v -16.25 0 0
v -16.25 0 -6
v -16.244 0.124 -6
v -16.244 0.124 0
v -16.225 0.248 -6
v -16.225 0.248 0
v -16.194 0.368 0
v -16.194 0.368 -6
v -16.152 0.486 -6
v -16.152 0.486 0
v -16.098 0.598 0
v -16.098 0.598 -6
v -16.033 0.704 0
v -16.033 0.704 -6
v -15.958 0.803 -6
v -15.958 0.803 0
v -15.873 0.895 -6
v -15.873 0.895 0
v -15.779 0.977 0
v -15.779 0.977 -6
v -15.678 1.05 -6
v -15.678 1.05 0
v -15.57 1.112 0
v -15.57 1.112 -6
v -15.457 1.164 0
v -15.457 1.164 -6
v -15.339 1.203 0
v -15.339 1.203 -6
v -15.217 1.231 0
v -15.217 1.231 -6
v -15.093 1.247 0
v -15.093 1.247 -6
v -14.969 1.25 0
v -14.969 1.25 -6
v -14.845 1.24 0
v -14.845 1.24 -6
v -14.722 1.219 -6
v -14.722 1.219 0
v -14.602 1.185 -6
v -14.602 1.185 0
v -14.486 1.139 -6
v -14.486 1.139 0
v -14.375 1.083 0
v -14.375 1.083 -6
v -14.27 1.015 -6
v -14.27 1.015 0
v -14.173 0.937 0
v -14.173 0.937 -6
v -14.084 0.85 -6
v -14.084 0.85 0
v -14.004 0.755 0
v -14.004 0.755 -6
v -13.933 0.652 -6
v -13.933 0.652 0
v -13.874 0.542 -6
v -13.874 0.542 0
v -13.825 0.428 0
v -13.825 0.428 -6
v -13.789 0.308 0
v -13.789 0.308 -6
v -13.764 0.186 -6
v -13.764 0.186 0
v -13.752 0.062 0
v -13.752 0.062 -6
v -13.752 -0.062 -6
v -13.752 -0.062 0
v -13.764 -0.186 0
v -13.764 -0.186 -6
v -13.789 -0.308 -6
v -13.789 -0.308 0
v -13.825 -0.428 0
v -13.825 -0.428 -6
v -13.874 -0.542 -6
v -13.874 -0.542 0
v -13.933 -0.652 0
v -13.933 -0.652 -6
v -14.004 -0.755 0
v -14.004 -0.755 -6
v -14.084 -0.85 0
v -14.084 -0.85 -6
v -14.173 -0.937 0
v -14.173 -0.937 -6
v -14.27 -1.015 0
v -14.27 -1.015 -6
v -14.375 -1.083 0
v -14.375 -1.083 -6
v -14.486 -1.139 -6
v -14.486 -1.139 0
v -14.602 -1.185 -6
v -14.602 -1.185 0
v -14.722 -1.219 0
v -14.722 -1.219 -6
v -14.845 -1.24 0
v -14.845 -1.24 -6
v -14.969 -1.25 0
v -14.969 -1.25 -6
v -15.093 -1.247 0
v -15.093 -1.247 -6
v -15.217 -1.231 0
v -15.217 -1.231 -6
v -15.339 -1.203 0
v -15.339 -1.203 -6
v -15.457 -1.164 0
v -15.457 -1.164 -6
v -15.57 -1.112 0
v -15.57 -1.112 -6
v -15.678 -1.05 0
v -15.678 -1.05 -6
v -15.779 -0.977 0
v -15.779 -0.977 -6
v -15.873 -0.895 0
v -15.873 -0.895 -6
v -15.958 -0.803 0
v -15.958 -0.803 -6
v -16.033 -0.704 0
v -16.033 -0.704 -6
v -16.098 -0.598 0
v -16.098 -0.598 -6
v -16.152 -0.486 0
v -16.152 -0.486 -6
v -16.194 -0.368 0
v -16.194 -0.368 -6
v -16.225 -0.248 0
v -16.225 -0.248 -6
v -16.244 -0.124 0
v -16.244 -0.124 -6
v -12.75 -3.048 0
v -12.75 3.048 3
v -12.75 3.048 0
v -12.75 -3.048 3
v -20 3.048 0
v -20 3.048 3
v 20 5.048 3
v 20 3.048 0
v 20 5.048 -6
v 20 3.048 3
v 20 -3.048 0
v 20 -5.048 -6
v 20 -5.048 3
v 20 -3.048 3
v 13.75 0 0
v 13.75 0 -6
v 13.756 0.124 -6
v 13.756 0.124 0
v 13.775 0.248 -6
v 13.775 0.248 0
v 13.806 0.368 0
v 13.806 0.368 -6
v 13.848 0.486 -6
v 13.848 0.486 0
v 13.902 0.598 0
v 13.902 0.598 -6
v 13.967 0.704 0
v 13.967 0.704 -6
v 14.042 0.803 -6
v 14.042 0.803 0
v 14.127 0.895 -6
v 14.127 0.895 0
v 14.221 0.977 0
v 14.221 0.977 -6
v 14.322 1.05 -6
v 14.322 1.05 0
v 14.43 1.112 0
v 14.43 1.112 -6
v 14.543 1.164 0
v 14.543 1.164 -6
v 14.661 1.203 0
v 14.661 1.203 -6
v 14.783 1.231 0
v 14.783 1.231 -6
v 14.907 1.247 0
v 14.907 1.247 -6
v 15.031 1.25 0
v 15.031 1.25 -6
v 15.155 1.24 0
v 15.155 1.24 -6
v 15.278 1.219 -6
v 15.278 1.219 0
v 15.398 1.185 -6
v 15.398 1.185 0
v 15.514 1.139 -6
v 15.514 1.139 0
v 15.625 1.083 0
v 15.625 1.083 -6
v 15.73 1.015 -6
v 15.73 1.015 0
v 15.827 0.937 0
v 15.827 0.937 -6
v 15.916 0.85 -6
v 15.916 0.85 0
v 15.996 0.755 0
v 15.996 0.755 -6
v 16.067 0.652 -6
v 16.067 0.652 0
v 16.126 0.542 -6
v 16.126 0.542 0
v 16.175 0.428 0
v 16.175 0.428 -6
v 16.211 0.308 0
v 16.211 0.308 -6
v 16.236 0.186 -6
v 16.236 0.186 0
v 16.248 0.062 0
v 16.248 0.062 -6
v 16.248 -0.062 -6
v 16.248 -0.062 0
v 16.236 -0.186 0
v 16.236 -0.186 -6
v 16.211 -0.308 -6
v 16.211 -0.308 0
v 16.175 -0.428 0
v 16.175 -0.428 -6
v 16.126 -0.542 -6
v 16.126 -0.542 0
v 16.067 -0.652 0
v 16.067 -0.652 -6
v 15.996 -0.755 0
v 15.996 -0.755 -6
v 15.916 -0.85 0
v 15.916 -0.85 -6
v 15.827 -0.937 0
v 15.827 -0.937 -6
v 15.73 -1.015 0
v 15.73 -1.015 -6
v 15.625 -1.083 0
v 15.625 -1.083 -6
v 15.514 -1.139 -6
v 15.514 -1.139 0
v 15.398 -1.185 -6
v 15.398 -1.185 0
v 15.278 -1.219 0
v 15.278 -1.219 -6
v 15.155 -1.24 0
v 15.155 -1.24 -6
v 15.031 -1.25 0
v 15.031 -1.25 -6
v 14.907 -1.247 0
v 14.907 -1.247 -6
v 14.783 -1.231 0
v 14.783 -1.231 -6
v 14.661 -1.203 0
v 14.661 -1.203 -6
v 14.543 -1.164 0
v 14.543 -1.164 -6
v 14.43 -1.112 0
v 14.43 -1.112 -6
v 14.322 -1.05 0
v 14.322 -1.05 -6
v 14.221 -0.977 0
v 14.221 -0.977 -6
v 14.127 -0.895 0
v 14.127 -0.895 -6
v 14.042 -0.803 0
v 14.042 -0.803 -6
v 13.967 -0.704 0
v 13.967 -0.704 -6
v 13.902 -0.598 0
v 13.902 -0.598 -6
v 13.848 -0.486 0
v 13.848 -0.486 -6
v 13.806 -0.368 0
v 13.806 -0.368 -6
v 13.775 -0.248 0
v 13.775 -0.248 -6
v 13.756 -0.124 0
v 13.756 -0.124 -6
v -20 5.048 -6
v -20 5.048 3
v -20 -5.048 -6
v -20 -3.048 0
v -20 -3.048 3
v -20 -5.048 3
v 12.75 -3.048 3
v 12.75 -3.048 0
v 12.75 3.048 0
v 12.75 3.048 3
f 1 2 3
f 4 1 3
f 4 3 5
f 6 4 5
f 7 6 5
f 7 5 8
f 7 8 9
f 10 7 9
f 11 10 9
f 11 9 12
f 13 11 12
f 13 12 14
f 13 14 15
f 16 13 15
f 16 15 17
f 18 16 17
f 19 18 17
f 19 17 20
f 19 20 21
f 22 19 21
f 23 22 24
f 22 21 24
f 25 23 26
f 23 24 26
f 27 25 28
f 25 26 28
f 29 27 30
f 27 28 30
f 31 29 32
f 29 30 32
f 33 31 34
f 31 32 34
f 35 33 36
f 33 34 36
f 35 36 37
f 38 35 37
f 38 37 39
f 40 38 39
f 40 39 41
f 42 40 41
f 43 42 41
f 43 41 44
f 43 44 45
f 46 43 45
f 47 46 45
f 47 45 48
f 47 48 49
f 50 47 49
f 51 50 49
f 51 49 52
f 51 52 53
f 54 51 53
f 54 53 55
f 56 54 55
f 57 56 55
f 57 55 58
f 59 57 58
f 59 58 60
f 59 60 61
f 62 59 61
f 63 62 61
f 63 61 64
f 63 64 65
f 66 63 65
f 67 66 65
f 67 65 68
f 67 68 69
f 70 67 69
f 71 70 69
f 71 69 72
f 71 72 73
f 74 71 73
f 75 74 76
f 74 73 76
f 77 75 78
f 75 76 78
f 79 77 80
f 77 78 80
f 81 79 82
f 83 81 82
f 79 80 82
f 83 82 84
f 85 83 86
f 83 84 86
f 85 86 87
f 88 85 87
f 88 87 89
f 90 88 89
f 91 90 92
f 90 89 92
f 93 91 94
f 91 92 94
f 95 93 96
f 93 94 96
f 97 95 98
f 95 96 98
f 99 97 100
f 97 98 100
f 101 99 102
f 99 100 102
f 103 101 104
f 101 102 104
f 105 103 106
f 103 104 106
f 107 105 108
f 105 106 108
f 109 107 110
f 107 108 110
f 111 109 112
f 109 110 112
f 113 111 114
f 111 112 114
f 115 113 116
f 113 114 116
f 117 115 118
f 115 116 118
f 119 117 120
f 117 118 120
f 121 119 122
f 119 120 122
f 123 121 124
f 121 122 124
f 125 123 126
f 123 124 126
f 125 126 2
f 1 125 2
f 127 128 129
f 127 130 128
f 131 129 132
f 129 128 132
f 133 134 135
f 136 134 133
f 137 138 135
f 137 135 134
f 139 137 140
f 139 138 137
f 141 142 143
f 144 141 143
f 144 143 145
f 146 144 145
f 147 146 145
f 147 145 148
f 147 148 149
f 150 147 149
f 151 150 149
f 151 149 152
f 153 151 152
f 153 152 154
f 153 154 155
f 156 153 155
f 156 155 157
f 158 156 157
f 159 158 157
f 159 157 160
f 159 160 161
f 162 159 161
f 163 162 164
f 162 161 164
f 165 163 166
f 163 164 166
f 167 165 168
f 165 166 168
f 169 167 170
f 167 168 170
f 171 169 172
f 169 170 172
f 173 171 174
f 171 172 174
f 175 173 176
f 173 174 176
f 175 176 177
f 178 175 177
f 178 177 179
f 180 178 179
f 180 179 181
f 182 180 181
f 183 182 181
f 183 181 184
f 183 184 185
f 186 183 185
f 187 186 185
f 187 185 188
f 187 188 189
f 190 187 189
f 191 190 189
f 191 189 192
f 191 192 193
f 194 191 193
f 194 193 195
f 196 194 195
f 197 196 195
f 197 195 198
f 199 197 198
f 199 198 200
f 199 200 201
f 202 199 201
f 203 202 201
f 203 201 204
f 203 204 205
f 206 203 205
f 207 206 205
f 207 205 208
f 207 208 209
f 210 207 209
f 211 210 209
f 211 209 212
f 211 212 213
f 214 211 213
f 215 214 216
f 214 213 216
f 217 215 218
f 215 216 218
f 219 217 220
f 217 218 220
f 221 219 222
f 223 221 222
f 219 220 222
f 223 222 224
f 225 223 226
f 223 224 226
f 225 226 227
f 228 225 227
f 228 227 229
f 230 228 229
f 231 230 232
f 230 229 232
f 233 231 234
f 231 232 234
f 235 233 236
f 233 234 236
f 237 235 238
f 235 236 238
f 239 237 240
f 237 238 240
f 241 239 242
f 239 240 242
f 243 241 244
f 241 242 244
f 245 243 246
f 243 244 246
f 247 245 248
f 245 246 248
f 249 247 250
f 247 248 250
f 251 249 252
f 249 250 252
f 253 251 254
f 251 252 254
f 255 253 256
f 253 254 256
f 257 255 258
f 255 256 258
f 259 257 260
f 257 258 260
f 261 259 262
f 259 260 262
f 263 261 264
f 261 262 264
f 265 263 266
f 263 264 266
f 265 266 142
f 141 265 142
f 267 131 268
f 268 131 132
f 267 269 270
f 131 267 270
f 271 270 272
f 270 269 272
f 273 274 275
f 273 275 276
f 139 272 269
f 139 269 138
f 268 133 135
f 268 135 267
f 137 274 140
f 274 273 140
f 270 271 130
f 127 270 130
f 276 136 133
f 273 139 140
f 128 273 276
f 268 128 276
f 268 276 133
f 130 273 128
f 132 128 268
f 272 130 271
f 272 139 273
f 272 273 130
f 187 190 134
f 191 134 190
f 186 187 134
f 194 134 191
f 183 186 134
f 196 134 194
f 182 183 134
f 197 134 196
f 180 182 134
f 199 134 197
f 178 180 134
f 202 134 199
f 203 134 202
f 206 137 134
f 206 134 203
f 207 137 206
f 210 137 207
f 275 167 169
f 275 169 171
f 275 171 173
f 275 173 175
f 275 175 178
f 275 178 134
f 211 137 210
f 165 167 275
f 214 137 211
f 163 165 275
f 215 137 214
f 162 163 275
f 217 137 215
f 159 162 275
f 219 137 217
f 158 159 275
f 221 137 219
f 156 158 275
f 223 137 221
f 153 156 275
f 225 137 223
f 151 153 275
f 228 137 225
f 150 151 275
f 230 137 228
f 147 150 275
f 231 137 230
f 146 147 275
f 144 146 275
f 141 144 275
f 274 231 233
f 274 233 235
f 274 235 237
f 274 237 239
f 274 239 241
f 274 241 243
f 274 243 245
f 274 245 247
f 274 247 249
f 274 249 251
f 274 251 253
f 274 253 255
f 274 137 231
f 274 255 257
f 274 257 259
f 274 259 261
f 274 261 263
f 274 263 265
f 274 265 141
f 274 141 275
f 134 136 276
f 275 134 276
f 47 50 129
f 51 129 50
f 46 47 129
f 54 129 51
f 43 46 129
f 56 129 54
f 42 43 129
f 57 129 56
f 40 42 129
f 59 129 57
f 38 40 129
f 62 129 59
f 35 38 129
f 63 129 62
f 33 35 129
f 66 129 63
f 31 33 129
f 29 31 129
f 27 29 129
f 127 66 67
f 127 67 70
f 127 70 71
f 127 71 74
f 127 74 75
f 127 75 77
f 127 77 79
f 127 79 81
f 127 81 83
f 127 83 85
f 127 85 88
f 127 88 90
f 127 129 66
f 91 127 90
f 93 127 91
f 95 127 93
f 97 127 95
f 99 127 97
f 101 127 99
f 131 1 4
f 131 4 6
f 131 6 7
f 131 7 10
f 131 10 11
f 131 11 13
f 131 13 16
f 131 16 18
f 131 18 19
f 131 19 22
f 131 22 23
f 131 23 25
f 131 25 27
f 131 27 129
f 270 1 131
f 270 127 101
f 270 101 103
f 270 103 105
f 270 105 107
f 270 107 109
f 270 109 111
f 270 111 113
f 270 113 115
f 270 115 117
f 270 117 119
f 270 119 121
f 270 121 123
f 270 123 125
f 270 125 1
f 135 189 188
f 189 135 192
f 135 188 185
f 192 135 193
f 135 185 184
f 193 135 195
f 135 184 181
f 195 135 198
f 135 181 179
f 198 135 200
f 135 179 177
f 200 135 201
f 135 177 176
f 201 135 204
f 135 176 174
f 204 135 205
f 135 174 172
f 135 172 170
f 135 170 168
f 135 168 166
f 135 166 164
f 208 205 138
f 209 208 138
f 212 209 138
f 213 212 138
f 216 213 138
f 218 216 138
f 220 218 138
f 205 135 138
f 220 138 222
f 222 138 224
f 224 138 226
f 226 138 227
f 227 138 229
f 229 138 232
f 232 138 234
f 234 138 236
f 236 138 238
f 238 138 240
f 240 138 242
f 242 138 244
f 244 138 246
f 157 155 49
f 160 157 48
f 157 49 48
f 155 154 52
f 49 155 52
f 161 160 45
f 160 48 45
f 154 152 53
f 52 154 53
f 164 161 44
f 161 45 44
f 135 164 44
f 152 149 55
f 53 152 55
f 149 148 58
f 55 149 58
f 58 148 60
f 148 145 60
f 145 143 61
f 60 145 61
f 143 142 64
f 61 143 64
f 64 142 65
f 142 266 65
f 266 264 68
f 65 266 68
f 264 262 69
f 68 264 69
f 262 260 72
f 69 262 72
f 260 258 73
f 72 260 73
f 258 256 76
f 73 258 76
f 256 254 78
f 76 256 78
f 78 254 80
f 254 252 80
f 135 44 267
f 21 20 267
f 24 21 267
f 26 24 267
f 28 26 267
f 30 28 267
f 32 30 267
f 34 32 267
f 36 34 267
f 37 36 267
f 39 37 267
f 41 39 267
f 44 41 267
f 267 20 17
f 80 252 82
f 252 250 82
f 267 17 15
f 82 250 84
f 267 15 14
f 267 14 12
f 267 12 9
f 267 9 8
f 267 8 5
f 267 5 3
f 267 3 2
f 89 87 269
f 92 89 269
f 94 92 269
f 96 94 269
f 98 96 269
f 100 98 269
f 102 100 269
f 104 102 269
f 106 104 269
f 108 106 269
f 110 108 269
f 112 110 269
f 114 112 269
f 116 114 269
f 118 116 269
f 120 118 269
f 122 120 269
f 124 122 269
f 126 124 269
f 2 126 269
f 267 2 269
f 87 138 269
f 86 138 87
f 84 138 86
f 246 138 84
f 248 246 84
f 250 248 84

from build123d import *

# Parameters (mm, degrees)
F1_DEPTH = 3.048
F2_W     = 40
F2_H     = 9
F3_DEPTH = 2
F4_W     = 40
F4_H     = 9
F5_DEPTH = 2
F7_D     = 2.5


with BuildPart() as f1:
    # F0 (on Front) → F1 (new body, symmetric)
    with BuildSketch(Plane.XZ):
        Polygon((-12.75, 0), (-20, 0), (-20, -6), (20, -6), (20, 0), (12.75, 0), (12.75, 3), (-12.75, 3), align=None)
    extrude(amount=F1_DEPTH, both=True)

    # F2 (on face) → F3 (join)
    with BuildSketch(Plane.XZ.offset(3.048)):
        with Locations((0, -1.5)):
            Rectangle(F2_W, F2_H)
    extrude(amount=F3_DEPTH)

    # F4 (on face) → F5 (join)
    with BuildSketch(Plane(origin=(0, 3.048, 0), x_dir=(-1, 0, 0), z_dir=(0, 1, 0))):
        with Locations((0, -1.5)):
            Rectangle(F4_W, F4_H)
    extrude(amount=F5_DEPTH)

    # F7 (through all)
    with Locations(Plane.XY):
        with Locations((-15, 0), (15, 0)):
            Hole(F7_D / 2)


solid = f1.part
